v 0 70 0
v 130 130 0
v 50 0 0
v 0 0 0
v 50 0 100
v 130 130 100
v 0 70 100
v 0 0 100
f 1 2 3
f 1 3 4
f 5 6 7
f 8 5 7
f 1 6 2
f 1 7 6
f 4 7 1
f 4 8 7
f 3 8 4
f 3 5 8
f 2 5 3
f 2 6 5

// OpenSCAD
linear_extrude(100.0000){polygon(points=[[0.0,0.0],[50.0,0.0],[130.0,130.0],[0.0,70.0]]);}
